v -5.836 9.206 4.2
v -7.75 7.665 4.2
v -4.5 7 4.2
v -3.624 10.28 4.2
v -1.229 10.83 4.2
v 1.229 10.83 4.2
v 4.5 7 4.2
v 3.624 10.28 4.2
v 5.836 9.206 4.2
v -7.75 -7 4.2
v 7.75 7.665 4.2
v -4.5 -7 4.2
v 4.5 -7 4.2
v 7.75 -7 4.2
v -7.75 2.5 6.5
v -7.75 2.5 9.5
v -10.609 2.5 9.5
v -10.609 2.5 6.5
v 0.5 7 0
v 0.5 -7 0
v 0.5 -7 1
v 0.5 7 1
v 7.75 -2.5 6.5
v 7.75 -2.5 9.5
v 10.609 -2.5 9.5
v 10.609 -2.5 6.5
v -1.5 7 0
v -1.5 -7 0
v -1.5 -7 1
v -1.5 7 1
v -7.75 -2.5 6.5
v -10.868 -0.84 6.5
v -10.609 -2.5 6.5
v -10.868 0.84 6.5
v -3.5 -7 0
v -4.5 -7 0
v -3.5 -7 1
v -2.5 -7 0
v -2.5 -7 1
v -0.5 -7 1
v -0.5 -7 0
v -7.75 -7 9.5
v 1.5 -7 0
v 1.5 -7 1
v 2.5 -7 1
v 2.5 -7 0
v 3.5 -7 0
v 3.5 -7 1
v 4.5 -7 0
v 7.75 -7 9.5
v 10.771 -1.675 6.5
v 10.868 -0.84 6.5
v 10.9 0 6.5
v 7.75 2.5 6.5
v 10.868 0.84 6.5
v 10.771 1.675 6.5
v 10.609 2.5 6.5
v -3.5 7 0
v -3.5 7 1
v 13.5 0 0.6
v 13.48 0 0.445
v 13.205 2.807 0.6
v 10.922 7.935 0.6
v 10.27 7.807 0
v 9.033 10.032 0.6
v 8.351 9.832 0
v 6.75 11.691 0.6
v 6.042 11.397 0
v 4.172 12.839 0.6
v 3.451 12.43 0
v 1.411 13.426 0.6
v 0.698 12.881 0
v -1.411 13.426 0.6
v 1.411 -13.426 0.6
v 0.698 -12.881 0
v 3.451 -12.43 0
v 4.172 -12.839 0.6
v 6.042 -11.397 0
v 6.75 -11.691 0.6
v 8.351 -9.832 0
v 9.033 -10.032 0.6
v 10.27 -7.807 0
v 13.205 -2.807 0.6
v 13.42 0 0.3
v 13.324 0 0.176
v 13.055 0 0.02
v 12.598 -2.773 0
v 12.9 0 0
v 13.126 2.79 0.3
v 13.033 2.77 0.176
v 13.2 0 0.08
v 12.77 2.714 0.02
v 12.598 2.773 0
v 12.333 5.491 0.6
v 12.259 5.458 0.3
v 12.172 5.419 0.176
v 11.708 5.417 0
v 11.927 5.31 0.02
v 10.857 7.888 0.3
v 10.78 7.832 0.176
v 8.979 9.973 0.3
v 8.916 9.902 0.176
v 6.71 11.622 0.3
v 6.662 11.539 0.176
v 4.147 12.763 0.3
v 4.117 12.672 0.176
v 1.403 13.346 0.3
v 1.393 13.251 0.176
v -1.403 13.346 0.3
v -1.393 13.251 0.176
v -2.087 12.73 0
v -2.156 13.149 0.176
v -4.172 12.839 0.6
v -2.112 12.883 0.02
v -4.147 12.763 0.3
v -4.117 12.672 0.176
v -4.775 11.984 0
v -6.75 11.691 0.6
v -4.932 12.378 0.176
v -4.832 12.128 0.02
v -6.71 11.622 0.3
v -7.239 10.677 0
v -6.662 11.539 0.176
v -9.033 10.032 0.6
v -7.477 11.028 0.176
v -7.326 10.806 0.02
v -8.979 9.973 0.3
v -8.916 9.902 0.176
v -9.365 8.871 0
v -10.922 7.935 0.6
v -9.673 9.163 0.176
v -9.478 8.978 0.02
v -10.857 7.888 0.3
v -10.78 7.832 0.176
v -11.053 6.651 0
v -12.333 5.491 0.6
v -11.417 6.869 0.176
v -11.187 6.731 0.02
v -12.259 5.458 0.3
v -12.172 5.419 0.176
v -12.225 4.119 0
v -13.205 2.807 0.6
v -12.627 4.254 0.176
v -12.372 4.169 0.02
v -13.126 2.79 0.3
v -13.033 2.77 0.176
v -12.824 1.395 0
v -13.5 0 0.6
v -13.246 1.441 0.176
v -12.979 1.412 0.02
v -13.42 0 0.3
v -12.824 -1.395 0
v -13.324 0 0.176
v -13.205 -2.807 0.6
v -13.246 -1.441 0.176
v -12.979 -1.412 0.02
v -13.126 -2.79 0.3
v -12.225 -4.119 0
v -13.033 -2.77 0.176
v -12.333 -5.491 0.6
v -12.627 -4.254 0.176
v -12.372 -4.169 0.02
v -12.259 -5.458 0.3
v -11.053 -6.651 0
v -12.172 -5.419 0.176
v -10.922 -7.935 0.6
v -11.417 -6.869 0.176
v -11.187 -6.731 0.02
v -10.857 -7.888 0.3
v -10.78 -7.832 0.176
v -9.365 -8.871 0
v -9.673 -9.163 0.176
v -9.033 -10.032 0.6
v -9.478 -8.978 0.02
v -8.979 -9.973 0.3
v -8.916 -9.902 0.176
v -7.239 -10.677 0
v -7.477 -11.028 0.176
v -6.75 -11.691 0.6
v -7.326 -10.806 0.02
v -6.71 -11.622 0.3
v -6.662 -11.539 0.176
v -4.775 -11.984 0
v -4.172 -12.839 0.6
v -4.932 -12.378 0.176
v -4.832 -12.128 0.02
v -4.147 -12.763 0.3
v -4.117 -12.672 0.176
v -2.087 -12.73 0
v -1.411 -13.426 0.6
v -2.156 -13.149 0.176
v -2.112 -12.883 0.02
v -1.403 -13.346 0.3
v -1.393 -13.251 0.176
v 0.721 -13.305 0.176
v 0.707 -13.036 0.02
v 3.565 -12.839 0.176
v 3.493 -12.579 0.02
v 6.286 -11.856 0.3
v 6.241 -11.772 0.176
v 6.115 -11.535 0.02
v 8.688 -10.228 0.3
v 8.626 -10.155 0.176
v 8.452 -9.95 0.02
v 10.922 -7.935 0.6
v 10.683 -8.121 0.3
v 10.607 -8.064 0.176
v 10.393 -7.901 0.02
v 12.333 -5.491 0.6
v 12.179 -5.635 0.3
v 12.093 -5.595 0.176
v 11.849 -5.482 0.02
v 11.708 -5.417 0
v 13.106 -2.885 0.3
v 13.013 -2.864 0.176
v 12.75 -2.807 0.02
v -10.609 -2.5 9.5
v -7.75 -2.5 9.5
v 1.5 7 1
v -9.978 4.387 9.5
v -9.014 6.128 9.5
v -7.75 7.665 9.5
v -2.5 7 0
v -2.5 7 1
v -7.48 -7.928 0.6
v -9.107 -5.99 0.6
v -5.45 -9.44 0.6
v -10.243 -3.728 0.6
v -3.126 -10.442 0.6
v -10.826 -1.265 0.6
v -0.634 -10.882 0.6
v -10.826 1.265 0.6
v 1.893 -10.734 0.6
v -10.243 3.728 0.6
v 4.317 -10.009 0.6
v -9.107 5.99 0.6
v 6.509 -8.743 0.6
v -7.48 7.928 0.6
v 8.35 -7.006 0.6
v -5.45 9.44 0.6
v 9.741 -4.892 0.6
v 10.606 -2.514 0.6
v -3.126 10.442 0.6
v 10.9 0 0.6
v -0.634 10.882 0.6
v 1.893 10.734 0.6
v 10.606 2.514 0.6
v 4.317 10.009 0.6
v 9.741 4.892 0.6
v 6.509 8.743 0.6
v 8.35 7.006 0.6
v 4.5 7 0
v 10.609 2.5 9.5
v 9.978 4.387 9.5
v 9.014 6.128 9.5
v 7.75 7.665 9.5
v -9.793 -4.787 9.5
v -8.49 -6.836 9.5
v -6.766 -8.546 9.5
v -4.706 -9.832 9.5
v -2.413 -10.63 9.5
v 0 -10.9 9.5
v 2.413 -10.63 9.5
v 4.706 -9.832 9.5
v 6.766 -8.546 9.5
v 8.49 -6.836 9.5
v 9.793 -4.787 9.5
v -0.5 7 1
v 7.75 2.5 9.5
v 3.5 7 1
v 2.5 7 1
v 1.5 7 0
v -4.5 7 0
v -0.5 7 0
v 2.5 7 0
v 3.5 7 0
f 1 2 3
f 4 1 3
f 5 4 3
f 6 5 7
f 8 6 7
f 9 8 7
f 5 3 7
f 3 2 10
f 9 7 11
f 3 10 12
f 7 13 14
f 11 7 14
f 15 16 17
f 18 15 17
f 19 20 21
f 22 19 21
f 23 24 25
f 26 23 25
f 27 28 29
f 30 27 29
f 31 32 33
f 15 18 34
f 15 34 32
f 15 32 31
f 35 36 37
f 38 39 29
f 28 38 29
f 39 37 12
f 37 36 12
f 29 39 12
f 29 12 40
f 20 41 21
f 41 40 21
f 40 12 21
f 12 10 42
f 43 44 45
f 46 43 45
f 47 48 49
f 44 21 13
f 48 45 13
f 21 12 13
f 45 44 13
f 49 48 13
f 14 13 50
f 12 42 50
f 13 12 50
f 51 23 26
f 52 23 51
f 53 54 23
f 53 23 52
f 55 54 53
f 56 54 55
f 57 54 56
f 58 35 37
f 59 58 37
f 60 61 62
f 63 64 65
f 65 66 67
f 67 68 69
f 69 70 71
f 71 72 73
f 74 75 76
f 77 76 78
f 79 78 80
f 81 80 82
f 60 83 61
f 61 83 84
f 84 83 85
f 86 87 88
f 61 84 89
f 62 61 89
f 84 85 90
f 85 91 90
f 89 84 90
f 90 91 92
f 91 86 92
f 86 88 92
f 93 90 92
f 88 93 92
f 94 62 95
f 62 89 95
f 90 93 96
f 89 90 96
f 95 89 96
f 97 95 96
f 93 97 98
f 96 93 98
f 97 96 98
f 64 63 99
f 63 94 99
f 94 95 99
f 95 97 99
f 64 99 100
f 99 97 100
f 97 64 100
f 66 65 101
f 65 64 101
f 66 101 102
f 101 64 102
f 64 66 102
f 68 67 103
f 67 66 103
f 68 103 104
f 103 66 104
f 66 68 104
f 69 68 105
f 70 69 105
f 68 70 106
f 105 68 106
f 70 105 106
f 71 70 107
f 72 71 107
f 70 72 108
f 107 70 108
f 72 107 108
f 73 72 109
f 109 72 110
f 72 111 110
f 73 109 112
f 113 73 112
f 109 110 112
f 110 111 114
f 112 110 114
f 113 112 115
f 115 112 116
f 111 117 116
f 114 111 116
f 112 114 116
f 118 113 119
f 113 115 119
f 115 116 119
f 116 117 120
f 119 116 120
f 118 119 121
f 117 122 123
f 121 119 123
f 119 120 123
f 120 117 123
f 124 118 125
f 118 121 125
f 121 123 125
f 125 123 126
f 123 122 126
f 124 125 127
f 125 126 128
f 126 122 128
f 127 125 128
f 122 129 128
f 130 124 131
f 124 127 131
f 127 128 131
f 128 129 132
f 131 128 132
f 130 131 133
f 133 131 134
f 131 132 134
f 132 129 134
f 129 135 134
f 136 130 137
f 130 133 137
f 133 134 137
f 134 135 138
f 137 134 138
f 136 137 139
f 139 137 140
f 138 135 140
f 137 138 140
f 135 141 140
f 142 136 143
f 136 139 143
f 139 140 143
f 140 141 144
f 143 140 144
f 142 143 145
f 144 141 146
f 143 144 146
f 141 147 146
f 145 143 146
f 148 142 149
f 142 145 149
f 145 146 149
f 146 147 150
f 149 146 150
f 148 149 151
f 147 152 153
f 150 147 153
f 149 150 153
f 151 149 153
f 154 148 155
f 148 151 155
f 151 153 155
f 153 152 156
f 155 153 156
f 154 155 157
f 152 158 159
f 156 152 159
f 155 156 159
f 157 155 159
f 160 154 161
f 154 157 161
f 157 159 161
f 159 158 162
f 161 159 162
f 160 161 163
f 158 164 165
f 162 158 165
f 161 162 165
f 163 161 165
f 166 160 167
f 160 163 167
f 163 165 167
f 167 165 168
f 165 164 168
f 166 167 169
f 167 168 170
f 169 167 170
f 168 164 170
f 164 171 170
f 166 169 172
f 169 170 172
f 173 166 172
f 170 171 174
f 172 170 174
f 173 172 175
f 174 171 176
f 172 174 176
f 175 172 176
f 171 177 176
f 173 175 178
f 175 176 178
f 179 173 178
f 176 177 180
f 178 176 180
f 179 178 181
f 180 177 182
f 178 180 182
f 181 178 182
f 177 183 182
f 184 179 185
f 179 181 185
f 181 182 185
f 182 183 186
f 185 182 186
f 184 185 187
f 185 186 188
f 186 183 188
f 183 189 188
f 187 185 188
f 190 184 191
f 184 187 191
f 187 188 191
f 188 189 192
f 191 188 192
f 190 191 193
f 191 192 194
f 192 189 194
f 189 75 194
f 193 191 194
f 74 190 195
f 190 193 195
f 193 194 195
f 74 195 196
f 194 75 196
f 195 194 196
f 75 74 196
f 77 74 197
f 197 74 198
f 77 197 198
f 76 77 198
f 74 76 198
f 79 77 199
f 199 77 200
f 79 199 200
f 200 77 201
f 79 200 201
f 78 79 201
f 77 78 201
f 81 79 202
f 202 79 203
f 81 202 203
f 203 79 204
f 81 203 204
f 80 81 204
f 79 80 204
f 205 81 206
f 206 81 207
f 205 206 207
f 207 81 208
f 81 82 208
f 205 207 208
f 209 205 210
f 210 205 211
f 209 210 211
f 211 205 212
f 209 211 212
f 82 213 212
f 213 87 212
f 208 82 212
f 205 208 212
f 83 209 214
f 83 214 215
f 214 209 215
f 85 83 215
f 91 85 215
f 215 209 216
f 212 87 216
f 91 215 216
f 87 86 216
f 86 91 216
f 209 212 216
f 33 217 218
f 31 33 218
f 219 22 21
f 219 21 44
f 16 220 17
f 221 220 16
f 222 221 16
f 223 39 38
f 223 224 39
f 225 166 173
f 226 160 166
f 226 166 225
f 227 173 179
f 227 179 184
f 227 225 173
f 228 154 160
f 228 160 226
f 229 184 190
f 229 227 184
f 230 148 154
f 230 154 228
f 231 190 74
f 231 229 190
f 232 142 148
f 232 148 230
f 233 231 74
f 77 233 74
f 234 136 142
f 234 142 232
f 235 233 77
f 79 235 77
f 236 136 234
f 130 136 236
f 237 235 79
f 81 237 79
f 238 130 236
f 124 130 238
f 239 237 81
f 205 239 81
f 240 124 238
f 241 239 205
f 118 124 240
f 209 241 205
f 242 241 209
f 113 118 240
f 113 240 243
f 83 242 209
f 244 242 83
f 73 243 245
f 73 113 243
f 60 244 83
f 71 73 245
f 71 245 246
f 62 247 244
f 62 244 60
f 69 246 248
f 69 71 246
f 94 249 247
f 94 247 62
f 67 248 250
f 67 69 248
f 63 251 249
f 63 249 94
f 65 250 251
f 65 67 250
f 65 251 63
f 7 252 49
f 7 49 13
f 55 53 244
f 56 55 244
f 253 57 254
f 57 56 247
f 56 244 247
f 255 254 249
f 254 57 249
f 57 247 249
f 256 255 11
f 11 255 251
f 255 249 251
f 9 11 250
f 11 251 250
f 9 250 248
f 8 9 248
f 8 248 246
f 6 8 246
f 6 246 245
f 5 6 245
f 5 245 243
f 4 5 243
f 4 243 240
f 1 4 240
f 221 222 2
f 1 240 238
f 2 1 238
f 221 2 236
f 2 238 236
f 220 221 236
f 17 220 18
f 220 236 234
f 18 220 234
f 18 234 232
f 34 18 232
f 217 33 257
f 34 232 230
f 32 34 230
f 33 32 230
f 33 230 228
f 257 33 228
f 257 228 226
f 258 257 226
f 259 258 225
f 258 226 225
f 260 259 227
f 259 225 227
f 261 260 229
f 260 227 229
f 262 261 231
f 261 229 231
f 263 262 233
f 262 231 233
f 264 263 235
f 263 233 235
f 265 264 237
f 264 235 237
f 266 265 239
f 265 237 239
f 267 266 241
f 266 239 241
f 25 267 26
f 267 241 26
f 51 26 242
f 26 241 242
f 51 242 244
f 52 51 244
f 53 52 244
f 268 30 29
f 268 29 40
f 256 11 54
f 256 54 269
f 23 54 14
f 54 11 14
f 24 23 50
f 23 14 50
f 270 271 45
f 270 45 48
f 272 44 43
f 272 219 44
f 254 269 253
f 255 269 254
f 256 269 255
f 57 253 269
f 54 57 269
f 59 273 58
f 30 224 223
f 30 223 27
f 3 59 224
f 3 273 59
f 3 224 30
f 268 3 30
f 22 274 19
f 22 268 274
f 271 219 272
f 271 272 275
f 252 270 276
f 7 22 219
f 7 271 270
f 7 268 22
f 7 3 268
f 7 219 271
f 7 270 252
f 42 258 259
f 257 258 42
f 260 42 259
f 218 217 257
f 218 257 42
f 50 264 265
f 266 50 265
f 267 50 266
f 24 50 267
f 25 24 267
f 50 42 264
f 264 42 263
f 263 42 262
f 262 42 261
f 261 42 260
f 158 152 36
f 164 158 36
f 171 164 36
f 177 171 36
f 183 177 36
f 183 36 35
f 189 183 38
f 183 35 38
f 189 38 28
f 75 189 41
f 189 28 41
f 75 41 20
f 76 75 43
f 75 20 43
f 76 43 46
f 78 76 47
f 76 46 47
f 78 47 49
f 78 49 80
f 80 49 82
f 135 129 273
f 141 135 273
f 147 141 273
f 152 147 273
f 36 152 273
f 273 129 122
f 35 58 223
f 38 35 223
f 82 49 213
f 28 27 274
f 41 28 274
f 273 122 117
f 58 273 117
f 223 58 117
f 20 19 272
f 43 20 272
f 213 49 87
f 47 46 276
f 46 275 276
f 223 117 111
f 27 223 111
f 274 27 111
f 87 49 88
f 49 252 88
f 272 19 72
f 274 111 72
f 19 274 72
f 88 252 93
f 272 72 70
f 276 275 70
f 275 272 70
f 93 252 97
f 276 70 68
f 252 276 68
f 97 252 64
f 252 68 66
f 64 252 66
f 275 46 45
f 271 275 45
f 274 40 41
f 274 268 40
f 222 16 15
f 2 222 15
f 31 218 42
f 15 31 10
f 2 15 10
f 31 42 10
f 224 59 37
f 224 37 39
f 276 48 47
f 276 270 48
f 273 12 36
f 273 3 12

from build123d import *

# Parameters (mm, degrees)
F0_R      = 13.5
F1_DEPTH  = 0.6
F2_R      = 0.59999
F5_R      = 10.9
F6_DEPTH  = 8.9
F9_DEPTH  = 7
F10_DEPTH = 7
F11_DEPTH = 25
F12_DEPTH = 7
F14_DEPTH = 3


# Not quite as in the source:
# - a fillet or chamfer is up to 0.001 mm smaller than in the source, because OpenCascade refuses the exact size


with BuildPart() as f1:
    # F0 (on Top) → F1 (new body)
    with BuildSketch(Plane.XY):
        Circle(F0_R)
    extrude(amount=F1_DEPTH)

    # F2 (radius 0.6 in the source; OpenCascade refuses exactly that, so slightly less here)
    f2_edges = [f1.edges().sort_by_distance(p)[0] for p in [
        (-13.5, 0, 0),
    ]]
    fillet(f2_edges, radius=F2_R)

    # F5 (on face) → F6 (join)
    with BuildSketch(Plane.XY.offset(0.6)):
        Circle(F5_R)
    extrude(amount=F6_DEPTH)

    # F3 (on Front) → F9 (cut)
    with BuildSketch(Plane.XZ):
        Polygon((-0.5, 0), (0, 0), (0.5, 0), (0.5, 1), (1.5, 1), (1.5, 0), (2.5, 0), (2.5, 1), (3.5, 1), (3.5, 0), (4.5, 0), (4.5, 4.2), (-4.5, 4.2), (-4.5, 0), (-3.5, 0), (-3.5, 1), (-2.5, 1), (-2.5, 0), (-1.5, 0), (-1.5, 1), (-0.5, 1), align=None)
    extrude(amount=-F9_DEPTH, mode=Mode.SUBTRACT)

    # F4 (on Front) → F10 (cut)
    with BuildSketch(Plane.XZ):
        Polygon((-0.5, 0), (0, 0), (0.5, 0), (0.5, 1), (1.5, 1), (1.5, 0), (2.5, 0), (2.5, 1), (3.5, 1), (3.5, 0), (4.5, 0), (4.5, 4.2), (-4.5, 4.2), (-4.5, 0), (-3.5, 0), (-3.5, 1), (-2.5, 1), (-2.5, 0), (-1.5, 0), (-1.5, 1), (-0.5, 1), align=None)
    extrude(amount=F10_DEPTH, mode=Mode.SUBTRACT)

    # F7 (on Front) → F11 (cut)
    with BuildSketch(Plane.XZ):
        Polygon((-7.75, 4.2), (0, 4.2), (7.75, 4.2), (7.75, 9.5), (-7.75, 9.5), align=None)
    extrude(amount=-F11_DEPTH, mode=Mode.SUBTRACT)

    # F8 (on Front) → F12 (cut)
    with BuildSketch(Plane.XZ):
        Polygon((-7.75, 4.2), (0, 4.2), (7.75, 4.2), (7.75, 9.5), (-7.75, 9.5), align=None)
    extrude(amount=F12_DEPTH, mode=Mode.SUBTRACT)

    # F13 (on face) → F14 (cut)
    with BuildSketch(Plane.XY.offset(9.5)):
        with BuildLine():
            Line((-7.75, -2.5), (-7.75, 0))
            Line((-7.75, 0), (-7.75, 2.5))
            Line((-7.75, 2.5), (-10.6094297679, 2.5))
            ThreePointArc((-10.6094297679, 2.5), (-10.9, 0), (-10.6094297679, -2.5))
            Line((-10.6094297679, -2.5), (-7.75, -2.5))
        make_face()
        with BuildLine():
            Line((7.75, 2.5), (7.75, 0))
            Line((7.75, 0), (7.75, -2.5))
            Line((7.75, -2.5), (10.6094297679, -2.5))
            ThreePointArc((10.6094297679, -2.5), (10.8271137537, -1.2584147826), (10.9, 0))
            ThreePointArc((10.9, 0), (10.8271137537, 1.2584147826), (10.6094297679, 2.5))
            Line((10.6094297679, 2.5), (7.75, 2.5))
        make_face()
    extrude(amount=-F14_DEPTH, mode=Mode.SUBTRACT)


solid = f1.part
